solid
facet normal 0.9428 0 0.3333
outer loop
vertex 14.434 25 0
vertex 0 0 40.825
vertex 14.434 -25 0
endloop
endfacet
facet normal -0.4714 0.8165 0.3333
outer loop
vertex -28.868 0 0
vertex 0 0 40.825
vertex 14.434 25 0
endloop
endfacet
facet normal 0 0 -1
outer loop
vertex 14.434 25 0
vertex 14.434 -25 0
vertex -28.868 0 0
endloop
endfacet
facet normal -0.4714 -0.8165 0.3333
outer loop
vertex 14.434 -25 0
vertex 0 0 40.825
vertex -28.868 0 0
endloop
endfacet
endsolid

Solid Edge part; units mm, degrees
sketch "Sketch1" plane through (0, 0, 0) normal (0, -1, 0) x (1, 0, 0)
  arc A0 (0, 75) -> (-75, 0) centre (0, 0) ccw
  line L0 (-75, 0) -> (0, 0)
  line L1 (0, 0) -> (0, 75)
revolve "RevolvedProtrusion1" add sketch "Sketch1" angle 360 about axis through (0, 0, 0) along (0, 0, 1)
sketch "Sketch2" plane through (0, 0, 0) normal (0, -1, 0) x (1, 0, 0)
  line L0 (0, 40.8248) -> (14.4338, 0)
  line L1 (-28.8675, 0) -> (0, 40.8248)
extrude "Cutout1" cut sketch "Sketch2" along normal through all and the other way through all material side at (7.264, 0, 20.4291)
pattern_circular "Pattern1" count 3 over 360 about axis through (0, 0, 0) along (0, 0, 1) of "Cutout1"
